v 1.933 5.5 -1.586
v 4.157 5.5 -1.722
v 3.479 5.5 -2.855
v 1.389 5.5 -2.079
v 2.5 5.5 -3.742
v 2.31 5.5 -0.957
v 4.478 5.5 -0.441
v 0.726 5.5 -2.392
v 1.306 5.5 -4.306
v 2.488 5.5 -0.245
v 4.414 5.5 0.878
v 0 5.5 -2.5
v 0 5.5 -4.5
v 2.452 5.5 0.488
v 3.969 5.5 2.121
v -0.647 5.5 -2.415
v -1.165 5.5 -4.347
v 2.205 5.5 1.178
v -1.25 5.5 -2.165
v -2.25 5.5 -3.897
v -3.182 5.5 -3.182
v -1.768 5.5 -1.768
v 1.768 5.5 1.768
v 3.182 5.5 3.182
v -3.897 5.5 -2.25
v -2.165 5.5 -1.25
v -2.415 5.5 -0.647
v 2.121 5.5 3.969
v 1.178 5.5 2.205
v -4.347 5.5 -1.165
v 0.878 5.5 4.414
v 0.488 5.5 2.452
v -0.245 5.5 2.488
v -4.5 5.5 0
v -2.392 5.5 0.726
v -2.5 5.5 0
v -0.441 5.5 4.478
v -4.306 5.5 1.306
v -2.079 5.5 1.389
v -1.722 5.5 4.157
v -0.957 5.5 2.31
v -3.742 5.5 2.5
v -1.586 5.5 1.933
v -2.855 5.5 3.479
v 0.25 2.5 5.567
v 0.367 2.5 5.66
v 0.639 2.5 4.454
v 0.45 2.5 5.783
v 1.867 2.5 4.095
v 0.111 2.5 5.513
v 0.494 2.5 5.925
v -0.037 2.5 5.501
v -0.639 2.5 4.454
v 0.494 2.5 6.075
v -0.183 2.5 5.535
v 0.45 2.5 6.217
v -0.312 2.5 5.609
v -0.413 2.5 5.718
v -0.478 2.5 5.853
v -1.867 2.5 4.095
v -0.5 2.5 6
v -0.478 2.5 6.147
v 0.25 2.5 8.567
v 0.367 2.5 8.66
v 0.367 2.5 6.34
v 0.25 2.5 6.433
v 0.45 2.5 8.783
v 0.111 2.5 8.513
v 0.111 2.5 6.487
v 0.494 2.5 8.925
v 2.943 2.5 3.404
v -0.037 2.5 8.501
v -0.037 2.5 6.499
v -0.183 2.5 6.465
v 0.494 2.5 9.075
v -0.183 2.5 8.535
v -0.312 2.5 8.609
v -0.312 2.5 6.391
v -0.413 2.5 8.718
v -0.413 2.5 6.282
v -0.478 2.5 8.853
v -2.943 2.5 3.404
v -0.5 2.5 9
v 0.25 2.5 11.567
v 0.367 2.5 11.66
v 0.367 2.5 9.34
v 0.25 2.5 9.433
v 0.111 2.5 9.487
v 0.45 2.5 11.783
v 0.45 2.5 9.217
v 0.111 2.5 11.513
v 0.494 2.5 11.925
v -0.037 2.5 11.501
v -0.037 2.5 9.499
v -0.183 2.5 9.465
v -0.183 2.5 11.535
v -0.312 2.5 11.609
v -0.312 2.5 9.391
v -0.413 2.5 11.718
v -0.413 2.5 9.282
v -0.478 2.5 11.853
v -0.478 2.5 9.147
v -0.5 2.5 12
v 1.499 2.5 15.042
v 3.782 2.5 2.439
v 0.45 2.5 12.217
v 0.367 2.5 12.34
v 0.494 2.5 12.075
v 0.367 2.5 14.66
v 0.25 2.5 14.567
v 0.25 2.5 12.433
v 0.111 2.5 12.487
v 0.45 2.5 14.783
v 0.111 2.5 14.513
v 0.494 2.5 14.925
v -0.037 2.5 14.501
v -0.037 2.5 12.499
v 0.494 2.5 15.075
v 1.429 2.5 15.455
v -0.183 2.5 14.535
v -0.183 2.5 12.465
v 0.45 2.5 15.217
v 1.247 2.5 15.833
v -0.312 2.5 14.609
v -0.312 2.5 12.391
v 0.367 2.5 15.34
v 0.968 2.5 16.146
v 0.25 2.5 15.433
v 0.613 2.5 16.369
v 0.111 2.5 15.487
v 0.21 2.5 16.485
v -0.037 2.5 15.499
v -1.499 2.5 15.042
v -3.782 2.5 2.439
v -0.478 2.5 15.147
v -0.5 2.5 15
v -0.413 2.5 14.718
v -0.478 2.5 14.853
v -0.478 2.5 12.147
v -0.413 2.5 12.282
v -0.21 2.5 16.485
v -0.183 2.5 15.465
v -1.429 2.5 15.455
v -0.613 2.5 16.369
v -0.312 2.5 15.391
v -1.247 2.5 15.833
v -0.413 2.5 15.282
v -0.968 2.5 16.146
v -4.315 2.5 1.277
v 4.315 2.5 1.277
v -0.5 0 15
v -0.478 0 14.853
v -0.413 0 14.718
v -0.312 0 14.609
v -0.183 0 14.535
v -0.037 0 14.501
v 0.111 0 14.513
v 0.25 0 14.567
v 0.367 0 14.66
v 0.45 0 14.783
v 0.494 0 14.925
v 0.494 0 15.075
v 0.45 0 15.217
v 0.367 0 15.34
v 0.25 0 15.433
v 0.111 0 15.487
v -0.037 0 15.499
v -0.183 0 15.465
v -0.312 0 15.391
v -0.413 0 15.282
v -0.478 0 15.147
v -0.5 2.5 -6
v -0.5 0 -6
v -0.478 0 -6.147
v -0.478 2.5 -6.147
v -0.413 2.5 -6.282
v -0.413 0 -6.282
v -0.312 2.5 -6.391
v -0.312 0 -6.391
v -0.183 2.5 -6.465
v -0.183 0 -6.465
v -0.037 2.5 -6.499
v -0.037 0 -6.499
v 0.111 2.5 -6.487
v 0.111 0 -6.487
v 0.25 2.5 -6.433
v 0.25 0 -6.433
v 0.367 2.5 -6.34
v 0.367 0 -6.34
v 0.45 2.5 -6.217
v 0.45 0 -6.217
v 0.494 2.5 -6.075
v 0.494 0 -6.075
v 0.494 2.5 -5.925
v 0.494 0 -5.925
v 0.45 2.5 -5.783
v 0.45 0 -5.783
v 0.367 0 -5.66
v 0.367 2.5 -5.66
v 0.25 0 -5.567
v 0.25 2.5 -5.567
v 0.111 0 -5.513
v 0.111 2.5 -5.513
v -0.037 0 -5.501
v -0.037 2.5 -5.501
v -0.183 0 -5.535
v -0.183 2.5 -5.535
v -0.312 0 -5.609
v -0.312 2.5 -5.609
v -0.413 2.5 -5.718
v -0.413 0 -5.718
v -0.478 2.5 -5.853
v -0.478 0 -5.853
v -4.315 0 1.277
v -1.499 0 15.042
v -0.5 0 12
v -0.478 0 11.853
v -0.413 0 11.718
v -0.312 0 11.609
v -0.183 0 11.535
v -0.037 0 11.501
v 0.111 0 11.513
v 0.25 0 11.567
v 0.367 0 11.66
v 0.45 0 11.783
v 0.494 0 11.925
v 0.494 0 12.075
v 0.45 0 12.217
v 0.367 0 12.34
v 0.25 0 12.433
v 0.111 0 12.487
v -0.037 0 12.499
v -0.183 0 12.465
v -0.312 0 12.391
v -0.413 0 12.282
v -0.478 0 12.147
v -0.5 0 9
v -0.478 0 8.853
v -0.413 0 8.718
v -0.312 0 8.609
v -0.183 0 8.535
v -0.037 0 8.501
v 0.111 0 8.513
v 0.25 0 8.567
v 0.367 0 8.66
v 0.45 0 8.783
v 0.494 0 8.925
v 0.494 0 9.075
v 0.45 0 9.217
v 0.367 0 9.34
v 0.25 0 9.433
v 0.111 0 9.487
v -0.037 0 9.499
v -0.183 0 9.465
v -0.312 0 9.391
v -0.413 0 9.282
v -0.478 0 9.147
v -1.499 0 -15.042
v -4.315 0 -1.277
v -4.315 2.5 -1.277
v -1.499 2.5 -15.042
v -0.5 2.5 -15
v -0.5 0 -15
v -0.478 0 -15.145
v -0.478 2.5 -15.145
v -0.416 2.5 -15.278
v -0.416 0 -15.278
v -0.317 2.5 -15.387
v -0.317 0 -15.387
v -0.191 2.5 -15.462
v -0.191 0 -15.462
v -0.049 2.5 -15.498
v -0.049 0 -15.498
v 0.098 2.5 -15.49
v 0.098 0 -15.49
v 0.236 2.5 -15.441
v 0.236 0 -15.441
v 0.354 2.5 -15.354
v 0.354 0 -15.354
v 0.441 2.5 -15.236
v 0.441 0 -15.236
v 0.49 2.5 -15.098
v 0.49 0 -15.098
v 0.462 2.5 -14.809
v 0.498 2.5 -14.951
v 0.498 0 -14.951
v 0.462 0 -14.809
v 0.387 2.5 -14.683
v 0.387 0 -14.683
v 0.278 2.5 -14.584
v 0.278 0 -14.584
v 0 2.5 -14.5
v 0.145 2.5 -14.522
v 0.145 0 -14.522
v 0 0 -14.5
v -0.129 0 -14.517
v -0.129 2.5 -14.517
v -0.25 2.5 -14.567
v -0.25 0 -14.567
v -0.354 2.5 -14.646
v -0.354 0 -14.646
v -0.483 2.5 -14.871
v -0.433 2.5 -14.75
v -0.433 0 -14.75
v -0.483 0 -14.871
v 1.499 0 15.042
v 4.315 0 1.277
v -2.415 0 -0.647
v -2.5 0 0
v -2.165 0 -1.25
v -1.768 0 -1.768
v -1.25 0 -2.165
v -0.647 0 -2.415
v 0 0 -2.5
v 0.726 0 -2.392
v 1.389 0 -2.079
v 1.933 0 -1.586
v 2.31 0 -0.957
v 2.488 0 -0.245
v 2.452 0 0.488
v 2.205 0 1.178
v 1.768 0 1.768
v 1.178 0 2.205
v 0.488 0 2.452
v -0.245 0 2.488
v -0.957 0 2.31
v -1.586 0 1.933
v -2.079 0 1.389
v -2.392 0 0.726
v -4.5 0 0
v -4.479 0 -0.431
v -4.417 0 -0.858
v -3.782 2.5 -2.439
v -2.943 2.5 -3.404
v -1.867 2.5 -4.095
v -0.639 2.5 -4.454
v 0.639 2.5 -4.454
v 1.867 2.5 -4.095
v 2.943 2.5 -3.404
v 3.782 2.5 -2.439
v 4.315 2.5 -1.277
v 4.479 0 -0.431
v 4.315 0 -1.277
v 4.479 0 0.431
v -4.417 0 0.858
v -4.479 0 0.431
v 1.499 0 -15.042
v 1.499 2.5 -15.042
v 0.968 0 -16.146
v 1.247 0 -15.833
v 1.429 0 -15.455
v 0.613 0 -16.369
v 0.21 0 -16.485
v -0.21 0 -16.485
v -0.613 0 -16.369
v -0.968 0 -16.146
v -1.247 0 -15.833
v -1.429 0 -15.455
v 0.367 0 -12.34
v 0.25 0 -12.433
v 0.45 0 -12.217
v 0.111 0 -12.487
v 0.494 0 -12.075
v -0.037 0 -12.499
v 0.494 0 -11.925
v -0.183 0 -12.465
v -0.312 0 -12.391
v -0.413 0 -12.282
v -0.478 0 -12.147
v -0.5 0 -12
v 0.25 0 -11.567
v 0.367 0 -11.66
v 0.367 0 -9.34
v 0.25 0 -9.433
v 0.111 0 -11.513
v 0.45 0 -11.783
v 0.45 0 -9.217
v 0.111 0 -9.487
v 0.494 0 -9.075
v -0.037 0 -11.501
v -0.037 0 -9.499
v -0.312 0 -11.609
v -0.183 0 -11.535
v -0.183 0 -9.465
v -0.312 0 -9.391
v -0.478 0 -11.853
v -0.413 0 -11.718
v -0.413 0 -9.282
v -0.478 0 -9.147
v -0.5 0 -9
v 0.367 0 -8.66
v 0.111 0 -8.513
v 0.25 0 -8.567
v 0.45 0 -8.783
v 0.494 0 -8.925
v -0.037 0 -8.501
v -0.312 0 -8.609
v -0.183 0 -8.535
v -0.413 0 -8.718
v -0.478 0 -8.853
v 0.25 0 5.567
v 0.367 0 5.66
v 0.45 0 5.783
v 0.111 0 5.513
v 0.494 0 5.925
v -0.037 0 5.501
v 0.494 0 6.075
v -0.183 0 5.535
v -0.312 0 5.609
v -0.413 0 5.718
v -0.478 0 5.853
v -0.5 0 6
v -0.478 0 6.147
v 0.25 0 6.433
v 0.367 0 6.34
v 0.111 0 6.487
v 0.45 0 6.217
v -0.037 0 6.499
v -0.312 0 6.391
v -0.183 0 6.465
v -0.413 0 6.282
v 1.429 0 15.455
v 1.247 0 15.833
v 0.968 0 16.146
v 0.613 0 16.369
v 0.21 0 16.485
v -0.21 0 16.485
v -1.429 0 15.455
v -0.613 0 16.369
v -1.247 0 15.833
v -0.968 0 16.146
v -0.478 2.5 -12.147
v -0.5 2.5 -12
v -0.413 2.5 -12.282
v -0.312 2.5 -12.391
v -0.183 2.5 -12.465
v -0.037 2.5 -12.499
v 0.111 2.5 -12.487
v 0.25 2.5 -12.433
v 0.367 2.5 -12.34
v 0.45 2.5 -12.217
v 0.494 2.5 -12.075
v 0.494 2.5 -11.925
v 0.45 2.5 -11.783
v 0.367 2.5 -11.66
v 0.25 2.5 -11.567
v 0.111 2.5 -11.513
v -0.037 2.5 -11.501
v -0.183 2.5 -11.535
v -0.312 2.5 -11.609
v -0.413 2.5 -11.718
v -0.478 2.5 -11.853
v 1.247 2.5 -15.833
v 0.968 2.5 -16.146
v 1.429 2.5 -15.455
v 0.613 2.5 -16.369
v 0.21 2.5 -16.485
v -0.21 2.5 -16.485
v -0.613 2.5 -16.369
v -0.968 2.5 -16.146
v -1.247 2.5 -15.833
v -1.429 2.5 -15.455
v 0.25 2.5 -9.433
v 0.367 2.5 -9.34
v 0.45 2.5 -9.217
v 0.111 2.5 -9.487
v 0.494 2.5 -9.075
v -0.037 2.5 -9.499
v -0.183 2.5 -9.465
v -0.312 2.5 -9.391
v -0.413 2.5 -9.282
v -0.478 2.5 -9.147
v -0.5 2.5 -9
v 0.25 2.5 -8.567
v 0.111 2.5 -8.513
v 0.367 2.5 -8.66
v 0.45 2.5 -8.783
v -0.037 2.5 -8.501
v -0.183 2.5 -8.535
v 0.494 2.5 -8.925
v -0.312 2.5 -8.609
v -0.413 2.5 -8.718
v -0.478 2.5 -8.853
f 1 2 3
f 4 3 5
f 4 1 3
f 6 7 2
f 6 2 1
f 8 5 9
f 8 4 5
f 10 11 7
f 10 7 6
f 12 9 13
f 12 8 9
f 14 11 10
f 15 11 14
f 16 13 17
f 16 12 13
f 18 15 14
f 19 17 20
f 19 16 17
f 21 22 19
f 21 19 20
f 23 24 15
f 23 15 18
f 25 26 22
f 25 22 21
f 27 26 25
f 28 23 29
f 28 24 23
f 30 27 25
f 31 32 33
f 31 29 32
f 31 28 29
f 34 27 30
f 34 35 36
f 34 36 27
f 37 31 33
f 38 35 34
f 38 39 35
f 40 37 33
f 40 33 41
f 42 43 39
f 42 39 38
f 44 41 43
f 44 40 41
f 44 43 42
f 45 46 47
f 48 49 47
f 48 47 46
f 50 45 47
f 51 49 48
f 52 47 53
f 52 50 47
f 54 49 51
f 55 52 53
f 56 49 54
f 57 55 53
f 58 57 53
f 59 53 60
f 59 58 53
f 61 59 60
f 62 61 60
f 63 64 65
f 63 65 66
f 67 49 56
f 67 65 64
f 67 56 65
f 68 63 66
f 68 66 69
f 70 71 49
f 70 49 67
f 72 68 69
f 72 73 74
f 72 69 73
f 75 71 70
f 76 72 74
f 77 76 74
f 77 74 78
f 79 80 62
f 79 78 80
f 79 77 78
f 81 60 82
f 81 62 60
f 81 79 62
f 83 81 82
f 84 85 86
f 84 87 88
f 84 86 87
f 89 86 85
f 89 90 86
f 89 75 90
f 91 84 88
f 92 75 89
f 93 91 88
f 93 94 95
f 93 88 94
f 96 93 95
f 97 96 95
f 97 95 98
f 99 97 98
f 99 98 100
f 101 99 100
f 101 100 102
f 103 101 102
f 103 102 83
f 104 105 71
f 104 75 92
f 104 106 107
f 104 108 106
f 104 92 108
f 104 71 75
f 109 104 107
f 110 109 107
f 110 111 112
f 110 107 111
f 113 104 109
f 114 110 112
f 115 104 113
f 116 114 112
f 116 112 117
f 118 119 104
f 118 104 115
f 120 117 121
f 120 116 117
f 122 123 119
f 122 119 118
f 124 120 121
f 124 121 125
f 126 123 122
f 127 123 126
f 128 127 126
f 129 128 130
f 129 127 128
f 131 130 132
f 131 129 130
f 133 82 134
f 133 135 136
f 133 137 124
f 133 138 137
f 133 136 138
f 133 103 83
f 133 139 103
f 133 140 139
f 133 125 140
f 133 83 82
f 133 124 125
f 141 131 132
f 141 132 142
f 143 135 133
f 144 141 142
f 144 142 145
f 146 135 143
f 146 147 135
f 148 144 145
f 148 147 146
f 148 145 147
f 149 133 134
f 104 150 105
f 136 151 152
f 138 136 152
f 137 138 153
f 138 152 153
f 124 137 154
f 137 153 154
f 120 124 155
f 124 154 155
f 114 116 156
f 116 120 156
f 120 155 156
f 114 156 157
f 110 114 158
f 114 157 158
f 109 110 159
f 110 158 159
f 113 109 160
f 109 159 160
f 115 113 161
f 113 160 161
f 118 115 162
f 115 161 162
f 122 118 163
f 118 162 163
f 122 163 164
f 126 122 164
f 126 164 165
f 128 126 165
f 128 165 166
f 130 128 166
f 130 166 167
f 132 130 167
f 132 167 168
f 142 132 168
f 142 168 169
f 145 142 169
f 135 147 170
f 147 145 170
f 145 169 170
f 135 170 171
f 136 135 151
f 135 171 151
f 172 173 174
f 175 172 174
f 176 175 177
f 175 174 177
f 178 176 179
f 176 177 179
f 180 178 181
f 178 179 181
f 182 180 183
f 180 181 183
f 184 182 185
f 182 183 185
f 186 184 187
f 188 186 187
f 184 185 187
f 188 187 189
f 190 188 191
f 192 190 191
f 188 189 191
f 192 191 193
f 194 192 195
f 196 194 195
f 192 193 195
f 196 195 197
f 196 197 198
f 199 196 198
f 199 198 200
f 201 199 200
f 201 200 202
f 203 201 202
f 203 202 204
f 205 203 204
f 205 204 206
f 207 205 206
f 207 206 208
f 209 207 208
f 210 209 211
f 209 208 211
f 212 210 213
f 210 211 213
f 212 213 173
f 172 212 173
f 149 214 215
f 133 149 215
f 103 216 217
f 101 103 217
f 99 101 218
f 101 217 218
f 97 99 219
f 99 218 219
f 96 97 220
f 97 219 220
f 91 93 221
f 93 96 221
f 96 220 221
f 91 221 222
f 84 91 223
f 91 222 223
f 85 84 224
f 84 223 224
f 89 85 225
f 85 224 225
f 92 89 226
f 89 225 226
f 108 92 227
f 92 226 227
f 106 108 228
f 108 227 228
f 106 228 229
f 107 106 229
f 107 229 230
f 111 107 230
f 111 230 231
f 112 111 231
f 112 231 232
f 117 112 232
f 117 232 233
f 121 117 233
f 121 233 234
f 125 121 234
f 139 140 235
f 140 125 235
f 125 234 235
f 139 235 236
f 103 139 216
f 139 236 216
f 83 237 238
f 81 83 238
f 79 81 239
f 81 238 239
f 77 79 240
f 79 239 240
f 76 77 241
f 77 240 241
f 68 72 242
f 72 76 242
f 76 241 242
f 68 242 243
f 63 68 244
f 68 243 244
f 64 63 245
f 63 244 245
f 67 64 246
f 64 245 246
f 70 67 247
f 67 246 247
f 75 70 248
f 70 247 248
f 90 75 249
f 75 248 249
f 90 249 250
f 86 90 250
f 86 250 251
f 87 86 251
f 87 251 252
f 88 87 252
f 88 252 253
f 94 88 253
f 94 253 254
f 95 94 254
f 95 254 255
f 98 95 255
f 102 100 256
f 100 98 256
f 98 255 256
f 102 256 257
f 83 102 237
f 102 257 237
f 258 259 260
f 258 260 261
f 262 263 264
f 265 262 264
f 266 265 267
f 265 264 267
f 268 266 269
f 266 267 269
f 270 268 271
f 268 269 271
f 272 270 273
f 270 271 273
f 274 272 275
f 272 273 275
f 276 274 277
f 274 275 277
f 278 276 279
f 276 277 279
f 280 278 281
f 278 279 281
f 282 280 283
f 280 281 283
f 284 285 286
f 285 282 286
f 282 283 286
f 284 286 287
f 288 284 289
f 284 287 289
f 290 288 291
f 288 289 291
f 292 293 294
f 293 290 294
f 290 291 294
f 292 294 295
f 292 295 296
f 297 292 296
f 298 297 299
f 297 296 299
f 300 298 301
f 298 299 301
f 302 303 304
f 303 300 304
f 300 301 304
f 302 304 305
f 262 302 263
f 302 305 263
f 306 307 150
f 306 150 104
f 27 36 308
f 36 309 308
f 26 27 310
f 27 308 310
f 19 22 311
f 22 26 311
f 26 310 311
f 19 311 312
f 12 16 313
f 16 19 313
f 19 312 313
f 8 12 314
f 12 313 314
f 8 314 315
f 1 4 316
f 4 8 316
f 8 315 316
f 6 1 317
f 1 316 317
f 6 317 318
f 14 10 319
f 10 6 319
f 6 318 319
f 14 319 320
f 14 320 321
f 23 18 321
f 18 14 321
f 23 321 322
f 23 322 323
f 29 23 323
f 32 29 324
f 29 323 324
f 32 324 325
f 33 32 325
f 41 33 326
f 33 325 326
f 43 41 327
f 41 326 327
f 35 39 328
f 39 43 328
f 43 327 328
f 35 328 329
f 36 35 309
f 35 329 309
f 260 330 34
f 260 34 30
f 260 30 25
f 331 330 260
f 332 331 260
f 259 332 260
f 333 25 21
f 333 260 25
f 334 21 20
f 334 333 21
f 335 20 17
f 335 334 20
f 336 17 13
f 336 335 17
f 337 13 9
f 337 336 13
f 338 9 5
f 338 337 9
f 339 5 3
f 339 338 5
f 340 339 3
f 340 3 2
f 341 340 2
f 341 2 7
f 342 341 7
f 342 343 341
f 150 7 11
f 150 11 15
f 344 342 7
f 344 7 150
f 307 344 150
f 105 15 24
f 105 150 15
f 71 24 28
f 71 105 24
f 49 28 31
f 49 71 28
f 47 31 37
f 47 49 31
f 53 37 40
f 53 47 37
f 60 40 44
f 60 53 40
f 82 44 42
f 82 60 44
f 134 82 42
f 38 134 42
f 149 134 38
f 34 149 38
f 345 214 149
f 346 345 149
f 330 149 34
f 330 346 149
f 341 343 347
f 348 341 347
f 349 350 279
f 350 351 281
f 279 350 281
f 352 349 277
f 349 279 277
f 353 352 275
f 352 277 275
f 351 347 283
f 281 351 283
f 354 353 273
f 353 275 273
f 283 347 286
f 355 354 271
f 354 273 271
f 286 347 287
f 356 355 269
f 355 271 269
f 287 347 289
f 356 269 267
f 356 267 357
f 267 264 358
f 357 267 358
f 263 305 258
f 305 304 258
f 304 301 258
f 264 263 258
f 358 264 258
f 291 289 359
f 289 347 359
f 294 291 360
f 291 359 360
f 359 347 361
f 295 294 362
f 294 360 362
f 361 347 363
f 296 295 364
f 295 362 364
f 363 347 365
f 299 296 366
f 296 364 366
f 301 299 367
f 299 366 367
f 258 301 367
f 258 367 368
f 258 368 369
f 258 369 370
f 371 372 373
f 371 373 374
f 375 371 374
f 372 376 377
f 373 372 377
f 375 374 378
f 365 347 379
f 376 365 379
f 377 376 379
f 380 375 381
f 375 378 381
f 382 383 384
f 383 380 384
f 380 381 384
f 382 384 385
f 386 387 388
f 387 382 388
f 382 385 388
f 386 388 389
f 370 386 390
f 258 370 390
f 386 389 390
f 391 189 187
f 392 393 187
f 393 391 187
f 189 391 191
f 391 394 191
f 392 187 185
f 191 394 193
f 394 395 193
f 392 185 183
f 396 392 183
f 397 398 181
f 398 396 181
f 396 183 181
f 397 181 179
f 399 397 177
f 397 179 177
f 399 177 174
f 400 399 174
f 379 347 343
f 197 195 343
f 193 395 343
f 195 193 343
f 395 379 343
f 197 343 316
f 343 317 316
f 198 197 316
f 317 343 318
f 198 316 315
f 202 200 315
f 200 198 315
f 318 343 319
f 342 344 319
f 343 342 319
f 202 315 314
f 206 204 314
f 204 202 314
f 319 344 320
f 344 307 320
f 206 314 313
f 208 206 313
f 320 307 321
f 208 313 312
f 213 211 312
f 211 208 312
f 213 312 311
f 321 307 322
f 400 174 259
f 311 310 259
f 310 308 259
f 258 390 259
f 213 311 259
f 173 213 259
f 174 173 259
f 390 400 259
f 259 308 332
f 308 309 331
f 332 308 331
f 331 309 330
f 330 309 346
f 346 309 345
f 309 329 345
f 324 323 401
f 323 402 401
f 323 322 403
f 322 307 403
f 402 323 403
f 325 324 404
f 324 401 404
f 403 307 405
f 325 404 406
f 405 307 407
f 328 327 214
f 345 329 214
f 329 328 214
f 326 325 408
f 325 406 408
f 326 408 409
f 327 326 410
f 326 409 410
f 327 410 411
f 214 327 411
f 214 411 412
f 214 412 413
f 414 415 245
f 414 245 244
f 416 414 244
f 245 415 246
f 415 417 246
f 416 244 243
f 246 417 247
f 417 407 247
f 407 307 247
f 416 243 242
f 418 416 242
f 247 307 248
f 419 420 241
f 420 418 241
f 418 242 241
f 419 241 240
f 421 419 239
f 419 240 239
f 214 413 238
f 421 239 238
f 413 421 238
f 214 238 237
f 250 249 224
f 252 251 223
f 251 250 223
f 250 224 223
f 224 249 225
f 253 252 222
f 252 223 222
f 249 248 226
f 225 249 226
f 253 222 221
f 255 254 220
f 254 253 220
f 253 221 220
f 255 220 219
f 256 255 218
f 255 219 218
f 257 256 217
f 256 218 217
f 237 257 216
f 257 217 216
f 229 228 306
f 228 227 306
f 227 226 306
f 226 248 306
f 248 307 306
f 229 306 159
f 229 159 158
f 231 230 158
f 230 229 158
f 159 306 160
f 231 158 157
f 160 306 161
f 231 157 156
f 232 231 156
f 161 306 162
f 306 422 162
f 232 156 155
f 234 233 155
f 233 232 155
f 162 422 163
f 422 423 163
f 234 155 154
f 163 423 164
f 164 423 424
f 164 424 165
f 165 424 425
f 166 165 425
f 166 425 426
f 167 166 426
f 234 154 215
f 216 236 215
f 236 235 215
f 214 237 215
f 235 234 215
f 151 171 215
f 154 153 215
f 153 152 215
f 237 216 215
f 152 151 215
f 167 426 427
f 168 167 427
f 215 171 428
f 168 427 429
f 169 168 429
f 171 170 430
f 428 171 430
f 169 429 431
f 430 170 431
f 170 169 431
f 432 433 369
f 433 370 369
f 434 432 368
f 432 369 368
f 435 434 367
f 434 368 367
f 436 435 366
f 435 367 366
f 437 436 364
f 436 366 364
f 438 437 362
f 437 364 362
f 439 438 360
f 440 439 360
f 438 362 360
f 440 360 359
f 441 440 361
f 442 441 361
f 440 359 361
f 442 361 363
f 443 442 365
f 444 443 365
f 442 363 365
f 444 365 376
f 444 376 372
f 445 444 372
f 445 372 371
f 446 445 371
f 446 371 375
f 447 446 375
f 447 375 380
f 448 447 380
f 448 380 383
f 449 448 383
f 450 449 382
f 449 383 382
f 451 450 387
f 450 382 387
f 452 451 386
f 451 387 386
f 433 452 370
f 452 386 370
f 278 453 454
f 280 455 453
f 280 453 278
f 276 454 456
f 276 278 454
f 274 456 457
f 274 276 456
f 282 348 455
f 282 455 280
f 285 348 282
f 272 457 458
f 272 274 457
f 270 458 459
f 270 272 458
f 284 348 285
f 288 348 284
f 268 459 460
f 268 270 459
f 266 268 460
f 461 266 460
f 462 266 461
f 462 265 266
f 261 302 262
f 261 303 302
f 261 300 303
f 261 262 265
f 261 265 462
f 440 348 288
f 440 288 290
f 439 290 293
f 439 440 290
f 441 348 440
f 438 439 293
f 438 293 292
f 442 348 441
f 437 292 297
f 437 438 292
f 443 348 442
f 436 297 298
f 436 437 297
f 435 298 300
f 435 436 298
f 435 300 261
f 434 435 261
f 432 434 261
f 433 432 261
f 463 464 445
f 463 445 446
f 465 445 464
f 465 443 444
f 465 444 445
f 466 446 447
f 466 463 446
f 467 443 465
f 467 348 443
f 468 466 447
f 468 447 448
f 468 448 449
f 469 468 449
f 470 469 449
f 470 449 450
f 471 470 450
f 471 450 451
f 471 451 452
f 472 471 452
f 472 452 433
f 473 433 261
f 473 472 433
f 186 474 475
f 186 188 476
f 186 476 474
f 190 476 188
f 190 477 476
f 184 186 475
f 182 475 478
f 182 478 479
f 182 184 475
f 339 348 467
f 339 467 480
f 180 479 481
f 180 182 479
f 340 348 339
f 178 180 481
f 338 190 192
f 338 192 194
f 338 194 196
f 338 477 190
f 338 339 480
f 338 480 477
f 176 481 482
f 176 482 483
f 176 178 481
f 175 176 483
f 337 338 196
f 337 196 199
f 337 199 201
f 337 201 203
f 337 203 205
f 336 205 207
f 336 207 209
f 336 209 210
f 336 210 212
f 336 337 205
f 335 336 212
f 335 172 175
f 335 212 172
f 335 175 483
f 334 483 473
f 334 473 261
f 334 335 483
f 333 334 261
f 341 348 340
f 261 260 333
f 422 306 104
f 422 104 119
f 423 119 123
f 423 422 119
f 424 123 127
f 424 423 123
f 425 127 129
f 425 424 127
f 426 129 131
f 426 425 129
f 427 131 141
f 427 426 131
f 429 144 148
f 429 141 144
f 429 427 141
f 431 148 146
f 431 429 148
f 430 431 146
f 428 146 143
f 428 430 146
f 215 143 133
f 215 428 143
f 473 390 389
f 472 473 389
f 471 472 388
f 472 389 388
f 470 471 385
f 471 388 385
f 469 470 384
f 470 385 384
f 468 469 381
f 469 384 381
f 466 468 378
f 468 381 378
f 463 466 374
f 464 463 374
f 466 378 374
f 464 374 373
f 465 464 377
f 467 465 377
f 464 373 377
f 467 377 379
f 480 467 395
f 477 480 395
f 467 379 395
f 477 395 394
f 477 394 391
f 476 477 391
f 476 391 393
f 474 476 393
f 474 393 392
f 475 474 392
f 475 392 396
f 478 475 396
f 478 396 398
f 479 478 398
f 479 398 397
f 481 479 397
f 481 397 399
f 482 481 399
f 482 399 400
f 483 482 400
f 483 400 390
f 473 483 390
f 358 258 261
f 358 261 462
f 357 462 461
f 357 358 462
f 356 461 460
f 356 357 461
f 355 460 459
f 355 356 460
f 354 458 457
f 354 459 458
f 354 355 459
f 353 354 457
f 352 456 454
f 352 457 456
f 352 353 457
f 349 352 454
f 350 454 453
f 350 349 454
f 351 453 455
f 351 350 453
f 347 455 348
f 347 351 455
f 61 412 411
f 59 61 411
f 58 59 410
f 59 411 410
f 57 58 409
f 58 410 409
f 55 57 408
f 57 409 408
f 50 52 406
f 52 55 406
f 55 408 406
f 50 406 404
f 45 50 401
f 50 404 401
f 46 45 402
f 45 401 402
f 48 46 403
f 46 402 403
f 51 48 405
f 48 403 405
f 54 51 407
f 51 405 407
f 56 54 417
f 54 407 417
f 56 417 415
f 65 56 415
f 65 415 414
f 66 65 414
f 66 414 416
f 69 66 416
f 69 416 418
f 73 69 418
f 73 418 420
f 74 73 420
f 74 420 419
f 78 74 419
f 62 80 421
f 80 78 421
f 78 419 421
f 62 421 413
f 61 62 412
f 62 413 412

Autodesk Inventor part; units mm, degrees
ref_plane "YZ Plane" through (0, 0, 0) normal (1, 0, 0) x (0, 1, 0)
ref_plane "XZ Plane" through (0, 0, 0) normal (0, 1, 0) x (-1, 0, 0)
ref_plane "XY Plane" through (0, 0, 0) normal (0, 0, 1) x (1, 0, 0)
sketch "Sketch1" plane through (0, 0, 0) normal (0, 1, 0) x (-1, 0, 0)
  circle A0 centre (0, 0) radius 4.5
  line L0 (0, 0) -> (0, -15)
  circle A1 centre (0, -15) radius 0.5
  circle A2 centre (0, -15) radius 1.5
  line L1 (4.3151, -1.2768) -> (1.4994, -15.0417)
  line L2 (-4.3151, -1.2768) -> (-1.4994, -15.0417)
  circle A3 centre (0, -6) radius 0.5
  circle A4 centre (0, -9) radius 0.5
  circle A5 centre (0, -12) radius 0.5
  line L3 (0, 0) -> (-1.4994, 0)
  circle A6 centre (0, 15) radius 0.5
  circle A7 centre (0, 15) radius 1.5
  line L4 (4.3151, 1.2768) -> (1.4994, 15.0417)
  line L5 (-4.3151, 1.2768) -> (-1.4994, 15.0417)
  circle A8 centre (0, 6) radius 0.5
  circle A9 centre (0, 9) radius 0.5
  circle A10 centre (0, 12) radius 0.5
  circle A11 centre (0, 0) radius 2.5
  dimension "d0" = 9
  dimension "d3" = 3
  dimension "d1" = 15
  dimension "d2" = 1
  dimension "d4" = 1
  dimension "d5" = 1
  dimension "d6" = 1
  dimension "d8" = 3
  dimension "d9" = 3
  dimension "d10" = 3
  dimension "d13" = 5
extrude "Extrusion1" add sketch "Sketch1" along normal blind 2.5 contours A0 L5 A7 L4 | L1 A2 L0 A5 A4 A3 A0 | A7 | L0 A3 A4 A5 A2 L2 A0 | A2
extrude "Extrusion2" add sketch "Sketch1" along normal blind 5.5 contours A0
properties part number "180Horn"
